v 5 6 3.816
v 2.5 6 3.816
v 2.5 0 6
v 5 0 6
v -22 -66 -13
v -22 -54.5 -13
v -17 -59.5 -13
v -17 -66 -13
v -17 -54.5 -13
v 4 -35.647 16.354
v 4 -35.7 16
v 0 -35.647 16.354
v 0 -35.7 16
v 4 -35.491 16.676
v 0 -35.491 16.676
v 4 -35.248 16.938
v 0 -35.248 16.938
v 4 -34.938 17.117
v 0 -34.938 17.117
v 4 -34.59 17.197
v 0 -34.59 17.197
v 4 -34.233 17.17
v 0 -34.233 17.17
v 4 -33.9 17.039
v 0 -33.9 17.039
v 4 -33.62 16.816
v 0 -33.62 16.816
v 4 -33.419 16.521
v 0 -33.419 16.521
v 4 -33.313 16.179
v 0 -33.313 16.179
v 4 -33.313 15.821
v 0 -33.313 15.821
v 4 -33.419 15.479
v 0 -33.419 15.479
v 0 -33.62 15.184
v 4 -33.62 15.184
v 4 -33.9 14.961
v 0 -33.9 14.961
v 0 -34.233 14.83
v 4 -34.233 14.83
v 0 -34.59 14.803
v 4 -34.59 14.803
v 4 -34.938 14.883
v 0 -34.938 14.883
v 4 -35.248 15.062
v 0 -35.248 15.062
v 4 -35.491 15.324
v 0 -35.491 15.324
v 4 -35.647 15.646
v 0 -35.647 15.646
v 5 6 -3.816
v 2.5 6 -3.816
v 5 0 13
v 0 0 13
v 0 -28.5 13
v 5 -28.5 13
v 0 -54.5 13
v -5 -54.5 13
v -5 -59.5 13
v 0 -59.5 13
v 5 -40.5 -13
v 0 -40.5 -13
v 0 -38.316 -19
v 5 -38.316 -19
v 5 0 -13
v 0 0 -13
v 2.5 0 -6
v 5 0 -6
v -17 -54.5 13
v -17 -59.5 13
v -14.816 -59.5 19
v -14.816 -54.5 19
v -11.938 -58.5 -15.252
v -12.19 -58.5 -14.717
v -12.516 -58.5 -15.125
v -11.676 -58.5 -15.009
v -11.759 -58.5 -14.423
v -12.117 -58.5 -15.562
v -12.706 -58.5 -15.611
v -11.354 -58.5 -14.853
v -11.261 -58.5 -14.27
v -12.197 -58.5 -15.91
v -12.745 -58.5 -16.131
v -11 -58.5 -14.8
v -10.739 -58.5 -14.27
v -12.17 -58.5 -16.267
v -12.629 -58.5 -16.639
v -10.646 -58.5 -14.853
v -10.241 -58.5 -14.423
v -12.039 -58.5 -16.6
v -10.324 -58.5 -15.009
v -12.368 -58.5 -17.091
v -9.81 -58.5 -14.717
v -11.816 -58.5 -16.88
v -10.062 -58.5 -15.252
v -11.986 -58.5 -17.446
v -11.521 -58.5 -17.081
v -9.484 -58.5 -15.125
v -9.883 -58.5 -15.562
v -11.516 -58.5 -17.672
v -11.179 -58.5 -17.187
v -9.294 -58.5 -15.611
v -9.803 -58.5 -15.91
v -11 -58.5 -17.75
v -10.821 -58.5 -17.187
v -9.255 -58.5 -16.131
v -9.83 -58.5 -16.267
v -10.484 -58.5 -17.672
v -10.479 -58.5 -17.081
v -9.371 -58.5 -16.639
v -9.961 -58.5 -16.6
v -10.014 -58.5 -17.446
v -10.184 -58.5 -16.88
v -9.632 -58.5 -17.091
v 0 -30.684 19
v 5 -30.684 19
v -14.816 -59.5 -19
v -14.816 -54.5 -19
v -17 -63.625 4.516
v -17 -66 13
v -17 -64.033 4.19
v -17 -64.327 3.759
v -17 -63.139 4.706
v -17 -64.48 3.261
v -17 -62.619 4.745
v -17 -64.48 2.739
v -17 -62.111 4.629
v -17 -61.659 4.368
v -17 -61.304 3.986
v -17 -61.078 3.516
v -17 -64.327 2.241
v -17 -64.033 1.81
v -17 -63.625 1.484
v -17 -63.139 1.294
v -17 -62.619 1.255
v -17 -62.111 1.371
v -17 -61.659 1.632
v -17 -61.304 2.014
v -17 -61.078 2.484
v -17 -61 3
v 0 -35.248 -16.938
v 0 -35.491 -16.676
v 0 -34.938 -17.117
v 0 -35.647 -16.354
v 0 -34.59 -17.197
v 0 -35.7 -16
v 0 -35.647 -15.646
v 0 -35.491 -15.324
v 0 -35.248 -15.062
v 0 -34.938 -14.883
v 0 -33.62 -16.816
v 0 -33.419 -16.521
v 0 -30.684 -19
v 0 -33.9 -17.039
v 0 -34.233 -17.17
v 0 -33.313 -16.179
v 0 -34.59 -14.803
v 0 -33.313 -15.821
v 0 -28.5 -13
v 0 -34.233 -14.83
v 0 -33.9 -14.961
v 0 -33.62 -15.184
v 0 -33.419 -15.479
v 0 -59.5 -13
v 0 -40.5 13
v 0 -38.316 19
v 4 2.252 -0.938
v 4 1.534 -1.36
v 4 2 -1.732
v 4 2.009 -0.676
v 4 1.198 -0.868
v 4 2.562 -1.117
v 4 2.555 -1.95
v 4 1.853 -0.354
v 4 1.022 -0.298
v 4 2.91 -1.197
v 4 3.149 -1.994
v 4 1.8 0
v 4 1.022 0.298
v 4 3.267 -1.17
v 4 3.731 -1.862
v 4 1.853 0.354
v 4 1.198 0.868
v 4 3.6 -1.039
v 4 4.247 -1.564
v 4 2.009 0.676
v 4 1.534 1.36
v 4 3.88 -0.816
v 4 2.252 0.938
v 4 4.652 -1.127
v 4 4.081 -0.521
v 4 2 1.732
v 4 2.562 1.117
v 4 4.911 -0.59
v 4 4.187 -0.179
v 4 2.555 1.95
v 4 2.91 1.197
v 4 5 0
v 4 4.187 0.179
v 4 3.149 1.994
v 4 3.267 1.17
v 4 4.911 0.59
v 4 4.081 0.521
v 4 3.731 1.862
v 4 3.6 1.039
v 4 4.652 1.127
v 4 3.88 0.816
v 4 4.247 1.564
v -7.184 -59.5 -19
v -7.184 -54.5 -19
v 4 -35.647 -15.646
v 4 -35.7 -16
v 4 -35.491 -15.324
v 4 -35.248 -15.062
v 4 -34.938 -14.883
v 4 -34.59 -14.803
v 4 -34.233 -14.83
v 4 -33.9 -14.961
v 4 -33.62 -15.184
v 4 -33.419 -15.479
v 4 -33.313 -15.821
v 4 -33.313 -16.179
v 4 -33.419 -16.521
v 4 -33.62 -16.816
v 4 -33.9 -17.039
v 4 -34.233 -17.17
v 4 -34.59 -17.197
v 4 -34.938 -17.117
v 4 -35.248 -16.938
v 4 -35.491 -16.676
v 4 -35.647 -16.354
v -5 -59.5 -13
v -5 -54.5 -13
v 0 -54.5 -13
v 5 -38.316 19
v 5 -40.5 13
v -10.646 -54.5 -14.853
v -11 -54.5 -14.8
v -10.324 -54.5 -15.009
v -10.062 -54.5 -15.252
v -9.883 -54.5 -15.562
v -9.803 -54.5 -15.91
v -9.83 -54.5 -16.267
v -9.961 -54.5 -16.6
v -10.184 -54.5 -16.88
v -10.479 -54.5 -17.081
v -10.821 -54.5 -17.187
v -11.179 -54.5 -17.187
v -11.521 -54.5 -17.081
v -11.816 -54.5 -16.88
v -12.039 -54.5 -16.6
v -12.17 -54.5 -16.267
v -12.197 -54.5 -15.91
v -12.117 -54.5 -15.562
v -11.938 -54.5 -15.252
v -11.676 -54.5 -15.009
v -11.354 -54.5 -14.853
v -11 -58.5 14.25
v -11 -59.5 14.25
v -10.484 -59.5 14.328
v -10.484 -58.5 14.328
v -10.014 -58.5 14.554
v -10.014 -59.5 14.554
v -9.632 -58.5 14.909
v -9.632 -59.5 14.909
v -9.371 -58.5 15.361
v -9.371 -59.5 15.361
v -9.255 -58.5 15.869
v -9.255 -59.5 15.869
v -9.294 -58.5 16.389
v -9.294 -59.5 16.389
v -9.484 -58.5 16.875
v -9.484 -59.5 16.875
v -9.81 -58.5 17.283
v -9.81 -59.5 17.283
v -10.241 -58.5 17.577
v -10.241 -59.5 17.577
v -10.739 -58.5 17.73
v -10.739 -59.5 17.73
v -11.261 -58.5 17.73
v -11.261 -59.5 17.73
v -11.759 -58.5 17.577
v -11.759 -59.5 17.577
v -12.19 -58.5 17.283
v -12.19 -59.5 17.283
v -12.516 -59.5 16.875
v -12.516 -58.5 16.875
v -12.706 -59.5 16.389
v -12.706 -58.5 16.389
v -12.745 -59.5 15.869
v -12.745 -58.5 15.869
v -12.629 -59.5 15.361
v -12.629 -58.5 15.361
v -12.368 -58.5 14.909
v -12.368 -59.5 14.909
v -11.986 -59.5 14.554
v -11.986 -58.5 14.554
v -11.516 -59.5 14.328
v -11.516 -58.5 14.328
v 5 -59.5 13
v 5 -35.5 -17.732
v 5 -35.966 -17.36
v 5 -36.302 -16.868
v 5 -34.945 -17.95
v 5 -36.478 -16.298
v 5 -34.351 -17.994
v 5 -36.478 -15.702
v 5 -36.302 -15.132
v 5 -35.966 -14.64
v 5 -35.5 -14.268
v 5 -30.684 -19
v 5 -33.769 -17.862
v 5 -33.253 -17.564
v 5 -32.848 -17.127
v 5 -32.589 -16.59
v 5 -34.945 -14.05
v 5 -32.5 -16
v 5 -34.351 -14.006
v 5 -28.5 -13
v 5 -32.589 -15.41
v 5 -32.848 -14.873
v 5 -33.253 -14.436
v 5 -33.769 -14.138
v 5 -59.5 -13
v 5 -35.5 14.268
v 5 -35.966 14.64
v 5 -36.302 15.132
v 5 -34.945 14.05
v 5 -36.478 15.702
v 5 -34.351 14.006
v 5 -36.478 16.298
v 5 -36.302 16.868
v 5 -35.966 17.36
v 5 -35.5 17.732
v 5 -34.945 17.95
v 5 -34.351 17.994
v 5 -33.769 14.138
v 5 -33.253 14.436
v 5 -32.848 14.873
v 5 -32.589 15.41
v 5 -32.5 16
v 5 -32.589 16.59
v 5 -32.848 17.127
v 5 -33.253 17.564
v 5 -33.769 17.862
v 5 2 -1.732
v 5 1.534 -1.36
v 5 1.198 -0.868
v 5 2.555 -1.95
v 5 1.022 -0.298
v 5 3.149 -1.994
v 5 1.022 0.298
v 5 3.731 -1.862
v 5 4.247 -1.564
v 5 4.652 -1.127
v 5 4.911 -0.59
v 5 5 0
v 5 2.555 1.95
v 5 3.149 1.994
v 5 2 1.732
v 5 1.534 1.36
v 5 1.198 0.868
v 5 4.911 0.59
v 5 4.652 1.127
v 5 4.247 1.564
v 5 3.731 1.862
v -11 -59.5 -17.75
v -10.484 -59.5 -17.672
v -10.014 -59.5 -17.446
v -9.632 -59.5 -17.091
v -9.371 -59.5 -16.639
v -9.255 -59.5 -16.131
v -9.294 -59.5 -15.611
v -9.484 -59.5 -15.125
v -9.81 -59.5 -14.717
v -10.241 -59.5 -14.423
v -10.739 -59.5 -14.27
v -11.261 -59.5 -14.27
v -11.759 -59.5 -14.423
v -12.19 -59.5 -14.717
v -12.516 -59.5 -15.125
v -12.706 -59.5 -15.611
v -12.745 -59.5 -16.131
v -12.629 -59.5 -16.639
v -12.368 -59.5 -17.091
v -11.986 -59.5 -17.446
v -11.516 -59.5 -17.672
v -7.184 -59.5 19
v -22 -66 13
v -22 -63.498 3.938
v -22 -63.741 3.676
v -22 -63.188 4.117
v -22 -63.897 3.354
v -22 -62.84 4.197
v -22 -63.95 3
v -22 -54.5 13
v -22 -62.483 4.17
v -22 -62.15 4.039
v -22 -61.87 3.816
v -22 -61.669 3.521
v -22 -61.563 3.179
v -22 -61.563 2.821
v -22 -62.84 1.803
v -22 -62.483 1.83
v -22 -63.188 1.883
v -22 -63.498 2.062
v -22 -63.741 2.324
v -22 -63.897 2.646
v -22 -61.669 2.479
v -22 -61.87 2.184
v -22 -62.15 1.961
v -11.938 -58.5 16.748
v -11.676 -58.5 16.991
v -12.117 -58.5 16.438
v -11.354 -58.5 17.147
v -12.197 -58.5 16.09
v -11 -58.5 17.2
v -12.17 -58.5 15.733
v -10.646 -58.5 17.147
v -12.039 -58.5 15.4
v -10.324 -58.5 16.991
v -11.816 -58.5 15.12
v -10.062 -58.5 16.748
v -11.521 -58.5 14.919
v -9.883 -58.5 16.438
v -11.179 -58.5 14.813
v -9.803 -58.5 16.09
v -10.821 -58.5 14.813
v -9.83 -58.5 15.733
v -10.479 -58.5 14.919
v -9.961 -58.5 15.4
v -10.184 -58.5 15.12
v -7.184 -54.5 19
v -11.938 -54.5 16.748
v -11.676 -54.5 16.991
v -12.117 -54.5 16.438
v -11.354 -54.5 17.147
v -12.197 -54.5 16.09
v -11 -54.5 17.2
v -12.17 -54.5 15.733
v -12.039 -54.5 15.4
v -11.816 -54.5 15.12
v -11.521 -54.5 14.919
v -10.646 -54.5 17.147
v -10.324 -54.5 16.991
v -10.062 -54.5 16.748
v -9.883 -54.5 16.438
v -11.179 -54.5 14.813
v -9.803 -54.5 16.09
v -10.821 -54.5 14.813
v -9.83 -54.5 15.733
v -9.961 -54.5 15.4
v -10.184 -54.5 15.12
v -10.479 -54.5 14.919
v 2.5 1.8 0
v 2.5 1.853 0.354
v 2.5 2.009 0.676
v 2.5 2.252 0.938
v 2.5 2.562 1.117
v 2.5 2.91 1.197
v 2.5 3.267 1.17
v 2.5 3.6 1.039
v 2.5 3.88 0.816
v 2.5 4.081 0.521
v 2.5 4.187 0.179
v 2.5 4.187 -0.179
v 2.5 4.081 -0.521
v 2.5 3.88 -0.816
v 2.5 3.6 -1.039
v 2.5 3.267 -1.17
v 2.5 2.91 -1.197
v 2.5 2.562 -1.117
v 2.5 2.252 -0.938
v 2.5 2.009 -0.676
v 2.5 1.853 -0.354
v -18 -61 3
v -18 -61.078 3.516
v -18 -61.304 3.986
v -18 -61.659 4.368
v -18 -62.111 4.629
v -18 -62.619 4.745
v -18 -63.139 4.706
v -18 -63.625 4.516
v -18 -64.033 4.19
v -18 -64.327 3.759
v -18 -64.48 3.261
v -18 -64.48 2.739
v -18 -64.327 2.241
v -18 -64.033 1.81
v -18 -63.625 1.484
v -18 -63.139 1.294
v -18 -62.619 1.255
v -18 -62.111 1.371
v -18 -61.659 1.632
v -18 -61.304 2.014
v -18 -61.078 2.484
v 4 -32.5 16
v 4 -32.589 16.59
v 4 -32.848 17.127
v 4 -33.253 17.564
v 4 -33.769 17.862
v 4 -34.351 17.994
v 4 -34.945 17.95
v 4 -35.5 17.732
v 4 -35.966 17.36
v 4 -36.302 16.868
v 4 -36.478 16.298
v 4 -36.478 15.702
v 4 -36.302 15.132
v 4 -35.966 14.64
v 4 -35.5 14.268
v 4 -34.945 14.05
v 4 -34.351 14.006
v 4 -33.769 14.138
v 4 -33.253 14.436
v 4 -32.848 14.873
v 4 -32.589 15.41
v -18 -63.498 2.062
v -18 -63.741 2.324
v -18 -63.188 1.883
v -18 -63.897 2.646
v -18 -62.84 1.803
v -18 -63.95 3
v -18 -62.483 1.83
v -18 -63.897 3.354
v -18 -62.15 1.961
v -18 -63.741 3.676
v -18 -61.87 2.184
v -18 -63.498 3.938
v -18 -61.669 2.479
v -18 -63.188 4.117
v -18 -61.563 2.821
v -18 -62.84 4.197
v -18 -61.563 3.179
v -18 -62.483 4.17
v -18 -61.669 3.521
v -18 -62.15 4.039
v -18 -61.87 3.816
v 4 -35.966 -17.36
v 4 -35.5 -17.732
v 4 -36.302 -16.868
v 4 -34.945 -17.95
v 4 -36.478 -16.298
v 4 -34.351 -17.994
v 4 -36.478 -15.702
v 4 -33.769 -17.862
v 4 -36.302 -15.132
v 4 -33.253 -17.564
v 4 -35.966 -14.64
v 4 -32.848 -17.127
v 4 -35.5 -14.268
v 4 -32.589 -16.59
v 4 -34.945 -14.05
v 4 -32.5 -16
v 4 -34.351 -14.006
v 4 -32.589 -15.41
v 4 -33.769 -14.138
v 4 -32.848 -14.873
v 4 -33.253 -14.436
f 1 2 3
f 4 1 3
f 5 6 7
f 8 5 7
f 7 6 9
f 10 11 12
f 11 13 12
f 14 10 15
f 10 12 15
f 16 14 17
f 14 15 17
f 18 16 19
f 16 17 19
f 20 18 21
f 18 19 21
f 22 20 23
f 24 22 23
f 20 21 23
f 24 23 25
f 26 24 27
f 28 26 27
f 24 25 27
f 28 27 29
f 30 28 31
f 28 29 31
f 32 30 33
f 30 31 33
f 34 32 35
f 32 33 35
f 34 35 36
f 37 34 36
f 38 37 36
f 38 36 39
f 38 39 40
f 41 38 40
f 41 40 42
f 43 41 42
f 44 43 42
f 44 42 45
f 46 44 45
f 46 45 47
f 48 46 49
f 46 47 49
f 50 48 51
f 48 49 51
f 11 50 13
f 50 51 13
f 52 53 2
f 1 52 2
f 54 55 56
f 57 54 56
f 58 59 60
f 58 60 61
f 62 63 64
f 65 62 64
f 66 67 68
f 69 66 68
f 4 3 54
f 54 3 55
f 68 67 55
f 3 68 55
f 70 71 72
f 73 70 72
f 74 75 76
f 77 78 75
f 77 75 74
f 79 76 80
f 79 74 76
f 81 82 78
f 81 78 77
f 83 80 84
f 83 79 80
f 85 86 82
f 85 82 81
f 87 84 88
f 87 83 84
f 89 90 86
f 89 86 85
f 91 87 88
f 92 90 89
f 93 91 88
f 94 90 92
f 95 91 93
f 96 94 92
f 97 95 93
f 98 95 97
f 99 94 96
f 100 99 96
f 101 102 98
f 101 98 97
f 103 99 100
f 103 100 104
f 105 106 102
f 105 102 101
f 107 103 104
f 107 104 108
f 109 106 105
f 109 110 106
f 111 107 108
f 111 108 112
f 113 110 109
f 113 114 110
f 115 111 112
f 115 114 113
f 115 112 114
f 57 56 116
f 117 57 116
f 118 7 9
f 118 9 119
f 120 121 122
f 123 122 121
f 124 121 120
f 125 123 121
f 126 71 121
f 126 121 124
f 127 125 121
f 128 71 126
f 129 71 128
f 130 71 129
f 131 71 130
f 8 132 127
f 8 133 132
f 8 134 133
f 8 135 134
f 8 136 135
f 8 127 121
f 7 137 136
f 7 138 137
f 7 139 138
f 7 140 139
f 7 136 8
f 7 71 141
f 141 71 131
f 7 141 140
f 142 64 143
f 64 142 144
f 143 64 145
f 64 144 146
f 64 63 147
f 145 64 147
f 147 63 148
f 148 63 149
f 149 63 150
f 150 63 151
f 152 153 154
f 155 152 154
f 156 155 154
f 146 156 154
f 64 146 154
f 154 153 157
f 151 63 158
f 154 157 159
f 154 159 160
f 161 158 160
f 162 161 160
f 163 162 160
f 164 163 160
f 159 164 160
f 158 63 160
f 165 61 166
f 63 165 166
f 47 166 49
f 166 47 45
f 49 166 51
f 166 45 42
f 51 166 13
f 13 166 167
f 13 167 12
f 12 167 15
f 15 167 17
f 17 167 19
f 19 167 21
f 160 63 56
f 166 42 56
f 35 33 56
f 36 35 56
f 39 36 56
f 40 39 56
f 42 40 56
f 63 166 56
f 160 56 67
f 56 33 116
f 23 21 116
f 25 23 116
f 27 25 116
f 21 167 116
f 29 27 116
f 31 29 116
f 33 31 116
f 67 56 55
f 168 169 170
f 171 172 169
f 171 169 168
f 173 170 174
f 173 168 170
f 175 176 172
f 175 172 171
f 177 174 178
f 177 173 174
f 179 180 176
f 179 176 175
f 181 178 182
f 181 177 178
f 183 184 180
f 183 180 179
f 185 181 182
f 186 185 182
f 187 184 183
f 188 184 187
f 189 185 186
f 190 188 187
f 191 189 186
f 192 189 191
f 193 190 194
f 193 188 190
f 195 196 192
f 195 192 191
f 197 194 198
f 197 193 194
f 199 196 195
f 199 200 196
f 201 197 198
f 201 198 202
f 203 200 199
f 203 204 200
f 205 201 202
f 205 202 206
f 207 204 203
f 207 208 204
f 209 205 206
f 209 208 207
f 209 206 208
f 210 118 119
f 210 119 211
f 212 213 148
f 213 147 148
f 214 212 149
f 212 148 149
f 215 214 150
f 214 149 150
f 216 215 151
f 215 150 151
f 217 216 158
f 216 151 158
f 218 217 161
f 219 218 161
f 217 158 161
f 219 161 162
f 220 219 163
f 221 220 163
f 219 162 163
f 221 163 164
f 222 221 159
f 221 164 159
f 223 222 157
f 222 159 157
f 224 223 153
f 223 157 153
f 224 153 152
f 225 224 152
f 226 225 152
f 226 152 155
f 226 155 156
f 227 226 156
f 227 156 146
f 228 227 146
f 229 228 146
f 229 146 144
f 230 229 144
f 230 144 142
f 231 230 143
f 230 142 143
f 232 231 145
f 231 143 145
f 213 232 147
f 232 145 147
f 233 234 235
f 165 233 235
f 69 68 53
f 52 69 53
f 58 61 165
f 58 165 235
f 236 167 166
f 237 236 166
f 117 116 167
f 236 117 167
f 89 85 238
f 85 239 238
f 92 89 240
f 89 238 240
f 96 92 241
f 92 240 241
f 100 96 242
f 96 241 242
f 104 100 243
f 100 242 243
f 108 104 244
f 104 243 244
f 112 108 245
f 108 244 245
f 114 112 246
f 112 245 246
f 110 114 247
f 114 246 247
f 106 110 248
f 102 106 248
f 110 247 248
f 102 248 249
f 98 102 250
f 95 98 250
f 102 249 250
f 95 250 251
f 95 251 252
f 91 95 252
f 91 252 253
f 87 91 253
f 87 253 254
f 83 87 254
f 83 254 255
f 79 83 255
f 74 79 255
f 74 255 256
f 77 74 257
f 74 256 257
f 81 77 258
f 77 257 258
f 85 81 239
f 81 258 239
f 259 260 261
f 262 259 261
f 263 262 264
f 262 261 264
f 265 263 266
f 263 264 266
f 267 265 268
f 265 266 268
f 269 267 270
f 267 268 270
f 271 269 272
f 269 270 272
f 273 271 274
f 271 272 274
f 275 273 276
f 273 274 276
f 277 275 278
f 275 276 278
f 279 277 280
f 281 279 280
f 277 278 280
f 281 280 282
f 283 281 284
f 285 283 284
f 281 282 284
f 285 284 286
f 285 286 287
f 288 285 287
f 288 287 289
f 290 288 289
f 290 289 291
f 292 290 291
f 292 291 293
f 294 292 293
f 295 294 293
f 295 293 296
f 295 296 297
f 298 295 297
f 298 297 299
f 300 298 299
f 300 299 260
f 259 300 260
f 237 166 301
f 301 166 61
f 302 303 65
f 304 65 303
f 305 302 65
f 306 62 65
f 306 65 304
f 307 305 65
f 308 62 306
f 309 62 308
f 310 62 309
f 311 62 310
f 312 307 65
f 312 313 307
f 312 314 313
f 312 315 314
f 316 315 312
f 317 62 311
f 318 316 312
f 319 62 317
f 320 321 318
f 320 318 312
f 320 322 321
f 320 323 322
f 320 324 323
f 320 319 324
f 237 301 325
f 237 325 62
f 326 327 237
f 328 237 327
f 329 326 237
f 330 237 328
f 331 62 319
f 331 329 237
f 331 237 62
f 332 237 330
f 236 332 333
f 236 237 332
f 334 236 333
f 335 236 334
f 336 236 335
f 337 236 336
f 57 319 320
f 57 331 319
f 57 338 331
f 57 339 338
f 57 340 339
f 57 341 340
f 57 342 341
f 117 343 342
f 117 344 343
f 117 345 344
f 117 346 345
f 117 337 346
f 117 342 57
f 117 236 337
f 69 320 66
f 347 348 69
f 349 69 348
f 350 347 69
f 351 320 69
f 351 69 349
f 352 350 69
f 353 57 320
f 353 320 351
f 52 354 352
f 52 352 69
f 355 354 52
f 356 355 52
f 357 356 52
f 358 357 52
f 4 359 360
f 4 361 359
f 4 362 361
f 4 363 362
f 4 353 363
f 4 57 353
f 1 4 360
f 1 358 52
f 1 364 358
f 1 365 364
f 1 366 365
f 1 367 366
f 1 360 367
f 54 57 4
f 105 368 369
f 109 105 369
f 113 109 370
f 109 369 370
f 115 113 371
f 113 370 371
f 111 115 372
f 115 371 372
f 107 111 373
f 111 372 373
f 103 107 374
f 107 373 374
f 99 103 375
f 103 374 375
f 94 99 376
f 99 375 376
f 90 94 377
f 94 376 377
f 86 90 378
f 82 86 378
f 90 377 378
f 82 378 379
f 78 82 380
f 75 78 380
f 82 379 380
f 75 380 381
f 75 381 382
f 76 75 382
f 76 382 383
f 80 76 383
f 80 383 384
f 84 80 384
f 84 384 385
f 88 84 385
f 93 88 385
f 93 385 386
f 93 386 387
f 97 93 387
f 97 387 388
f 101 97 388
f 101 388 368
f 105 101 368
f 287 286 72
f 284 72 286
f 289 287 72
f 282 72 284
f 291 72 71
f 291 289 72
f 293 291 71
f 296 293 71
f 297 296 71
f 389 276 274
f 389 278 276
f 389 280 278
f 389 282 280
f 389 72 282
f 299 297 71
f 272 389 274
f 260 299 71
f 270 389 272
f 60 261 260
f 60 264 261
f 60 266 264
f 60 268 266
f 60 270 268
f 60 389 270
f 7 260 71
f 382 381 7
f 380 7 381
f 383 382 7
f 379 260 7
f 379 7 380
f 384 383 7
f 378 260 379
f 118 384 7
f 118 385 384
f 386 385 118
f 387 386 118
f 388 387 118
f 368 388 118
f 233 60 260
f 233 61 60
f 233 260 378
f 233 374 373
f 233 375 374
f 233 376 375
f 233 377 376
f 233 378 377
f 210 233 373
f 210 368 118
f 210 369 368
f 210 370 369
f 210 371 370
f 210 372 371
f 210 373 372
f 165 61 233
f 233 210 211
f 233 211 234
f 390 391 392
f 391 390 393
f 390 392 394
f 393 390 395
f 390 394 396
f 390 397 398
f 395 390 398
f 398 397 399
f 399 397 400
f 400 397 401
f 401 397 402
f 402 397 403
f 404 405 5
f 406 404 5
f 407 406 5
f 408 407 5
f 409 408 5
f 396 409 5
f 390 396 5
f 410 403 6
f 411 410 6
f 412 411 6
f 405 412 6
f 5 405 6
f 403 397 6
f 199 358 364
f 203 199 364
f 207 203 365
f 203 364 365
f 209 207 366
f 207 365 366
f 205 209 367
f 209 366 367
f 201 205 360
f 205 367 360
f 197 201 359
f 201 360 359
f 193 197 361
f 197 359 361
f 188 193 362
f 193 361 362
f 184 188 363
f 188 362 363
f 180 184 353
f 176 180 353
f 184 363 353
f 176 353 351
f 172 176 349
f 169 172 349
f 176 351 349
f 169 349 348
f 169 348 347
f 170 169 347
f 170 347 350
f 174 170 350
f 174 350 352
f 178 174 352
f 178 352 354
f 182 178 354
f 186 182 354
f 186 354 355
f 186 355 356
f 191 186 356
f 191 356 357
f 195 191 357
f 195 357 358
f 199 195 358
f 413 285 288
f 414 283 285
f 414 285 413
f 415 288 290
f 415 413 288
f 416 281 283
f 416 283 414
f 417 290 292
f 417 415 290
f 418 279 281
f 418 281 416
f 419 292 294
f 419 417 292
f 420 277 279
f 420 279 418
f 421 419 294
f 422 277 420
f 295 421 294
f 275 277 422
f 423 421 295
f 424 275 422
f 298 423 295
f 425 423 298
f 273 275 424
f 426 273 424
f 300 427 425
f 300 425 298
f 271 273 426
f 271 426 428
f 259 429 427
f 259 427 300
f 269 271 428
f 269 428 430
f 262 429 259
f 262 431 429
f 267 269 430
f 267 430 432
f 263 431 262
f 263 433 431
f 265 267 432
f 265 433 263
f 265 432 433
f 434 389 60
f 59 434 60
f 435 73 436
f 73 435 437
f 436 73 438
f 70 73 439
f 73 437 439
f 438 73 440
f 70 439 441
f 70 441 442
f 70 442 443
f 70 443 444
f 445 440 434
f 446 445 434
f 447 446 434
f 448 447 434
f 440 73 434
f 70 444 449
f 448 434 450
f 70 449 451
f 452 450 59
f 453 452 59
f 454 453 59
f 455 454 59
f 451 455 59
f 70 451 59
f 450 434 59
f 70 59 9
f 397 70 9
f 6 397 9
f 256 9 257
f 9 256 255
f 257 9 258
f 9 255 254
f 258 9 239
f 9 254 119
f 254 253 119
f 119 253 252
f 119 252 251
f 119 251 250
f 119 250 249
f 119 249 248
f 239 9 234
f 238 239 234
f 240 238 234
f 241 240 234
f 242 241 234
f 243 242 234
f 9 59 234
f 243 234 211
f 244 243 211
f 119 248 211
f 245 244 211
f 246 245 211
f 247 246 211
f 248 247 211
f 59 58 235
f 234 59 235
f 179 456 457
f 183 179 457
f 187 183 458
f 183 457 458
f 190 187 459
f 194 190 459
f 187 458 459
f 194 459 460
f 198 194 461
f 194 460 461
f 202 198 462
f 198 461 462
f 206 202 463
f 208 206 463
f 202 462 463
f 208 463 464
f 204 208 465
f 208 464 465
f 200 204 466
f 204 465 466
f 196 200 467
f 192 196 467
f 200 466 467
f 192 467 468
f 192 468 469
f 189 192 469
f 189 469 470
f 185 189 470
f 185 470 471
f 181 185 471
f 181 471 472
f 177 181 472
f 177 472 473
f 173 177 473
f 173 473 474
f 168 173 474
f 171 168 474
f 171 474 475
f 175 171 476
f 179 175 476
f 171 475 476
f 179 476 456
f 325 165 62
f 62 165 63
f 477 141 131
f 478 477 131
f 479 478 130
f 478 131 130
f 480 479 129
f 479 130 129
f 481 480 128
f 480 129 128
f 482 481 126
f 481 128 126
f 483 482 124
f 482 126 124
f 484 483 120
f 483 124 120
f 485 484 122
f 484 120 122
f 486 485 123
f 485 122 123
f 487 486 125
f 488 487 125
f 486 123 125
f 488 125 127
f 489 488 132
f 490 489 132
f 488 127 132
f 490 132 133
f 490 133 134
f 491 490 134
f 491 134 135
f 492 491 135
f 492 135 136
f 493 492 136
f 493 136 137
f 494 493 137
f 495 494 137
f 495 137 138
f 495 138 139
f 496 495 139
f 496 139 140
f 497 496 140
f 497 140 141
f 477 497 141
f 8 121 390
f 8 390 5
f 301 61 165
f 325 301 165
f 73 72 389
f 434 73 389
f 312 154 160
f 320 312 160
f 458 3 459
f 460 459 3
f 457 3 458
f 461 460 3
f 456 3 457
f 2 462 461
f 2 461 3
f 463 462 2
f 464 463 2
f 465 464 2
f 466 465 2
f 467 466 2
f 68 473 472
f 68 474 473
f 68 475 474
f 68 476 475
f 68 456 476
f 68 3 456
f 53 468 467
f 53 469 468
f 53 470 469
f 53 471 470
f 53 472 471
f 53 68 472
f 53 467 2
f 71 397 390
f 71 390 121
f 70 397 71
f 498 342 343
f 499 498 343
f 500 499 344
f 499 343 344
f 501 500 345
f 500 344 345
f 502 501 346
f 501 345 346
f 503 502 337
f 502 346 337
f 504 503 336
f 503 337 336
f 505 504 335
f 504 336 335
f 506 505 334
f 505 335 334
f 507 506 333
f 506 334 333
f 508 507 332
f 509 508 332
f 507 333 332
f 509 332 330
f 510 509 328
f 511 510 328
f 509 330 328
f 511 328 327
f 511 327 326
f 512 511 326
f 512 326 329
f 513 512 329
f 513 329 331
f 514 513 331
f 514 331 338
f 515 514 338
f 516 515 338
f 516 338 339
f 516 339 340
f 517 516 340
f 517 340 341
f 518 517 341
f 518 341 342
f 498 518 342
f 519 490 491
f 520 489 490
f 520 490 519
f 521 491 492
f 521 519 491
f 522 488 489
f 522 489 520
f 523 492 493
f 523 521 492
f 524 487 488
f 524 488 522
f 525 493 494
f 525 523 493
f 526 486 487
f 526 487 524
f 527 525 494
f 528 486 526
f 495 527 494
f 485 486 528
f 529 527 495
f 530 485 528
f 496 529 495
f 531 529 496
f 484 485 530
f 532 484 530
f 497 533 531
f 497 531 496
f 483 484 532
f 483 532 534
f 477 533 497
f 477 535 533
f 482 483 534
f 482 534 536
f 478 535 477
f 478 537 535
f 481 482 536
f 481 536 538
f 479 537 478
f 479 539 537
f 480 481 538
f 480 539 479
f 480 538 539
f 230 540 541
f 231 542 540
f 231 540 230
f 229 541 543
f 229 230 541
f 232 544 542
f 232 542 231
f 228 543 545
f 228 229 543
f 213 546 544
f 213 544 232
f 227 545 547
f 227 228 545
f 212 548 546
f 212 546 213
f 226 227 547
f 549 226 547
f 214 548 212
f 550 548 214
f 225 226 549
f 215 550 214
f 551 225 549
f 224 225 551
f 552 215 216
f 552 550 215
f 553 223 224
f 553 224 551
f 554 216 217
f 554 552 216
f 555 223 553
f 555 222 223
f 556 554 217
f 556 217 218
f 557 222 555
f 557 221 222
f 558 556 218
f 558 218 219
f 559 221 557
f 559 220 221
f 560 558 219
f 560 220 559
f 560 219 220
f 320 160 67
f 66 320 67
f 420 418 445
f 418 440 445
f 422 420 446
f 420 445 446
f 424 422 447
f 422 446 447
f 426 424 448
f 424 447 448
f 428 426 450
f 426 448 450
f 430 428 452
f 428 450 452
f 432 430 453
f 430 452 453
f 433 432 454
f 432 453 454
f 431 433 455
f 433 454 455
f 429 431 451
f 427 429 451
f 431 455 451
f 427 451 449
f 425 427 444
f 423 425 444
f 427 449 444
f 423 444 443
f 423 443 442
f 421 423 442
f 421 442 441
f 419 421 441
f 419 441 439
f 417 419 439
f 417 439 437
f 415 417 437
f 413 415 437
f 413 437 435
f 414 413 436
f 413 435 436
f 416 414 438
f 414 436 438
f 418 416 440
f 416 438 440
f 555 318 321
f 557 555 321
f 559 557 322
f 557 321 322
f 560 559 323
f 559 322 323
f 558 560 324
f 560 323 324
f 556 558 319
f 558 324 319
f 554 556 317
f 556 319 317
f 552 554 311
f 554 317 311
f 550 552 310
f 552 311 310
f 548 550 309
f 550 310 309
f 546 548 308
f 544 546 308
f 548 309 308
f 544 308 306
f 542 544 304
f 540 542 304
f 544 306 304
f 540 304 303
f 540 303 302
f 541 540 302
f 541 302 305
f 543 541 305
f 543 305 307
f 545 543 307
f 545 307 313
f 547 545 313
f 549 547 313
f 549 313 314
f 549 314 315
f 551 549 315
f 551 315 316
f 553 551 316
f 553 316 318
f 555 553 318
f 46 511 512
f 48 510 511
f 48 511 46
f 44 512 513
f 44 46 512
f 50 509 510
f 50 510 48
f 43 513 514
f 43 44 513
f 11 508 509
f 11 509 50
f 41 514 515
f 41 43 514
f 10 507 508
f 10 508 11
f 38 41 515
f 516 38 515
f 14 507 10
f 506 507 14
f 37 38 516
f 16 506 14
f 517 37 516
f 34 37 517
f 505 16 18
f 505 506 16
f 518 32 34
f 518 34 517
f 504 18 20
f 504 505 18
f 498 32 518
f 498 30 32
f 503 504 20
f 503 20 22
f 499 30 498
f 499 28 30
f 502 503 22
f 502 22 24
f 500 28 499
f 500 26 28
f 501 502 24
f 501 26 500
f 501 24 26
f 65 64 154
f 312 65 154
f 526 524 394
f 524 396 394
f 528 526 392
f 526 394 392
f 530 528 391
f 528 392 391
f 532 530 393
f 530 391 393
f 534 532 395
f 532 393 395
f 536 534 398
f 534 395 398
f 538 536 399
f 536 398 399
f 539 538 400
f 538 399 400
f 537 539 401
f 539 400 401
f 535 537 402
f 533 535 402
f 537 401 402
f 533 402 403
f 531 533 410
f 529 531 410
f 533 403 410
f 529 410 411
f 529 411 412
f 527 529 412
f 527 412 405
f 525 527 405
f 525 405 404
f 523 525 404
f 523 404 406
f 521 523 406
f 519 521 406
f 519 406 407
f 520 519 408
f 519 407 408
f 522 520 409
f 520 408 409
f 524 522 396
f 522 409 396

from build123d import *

# Parameters (mm, degrees)
PAD_DEPTH           = 5
HOLE_D              = 2.4
HOLE_DEPTH          = 25
HOLE_CBORE_D        = 4
HOLE_CBORE_DEPTH    = 1
POCKET_DEPTH        = 2.5
SKETCH036_W         = 5
SKETCH036_H         = 26
PAD001_DEPTH        = 22
SKETCH037_W         = 26
SKETCH037_H         = 5
PAD002_DEPTH        = 6.5
HOLE001_D           = 2.4
HOLE001_DEPTH       = 25
HOLE001_CBORE_D     = 3.5
HOLE001_CBORE_DEPTH = 1
PAD003_DEPTH        = 5
HOLE002_D           = 2.4
HOLE002_DEPTH       = 25
HOLE002_CBORE_D     = 3.5
HOLE002_CBORE_DEPTH = 1


with BuildPart() as ch001:
    # Sketch → Pad (new body)
    with BuildSketch(Plane.YZ):
        Polygon((-59.5, 13), (-59.5, -13), (-40.5, -13), (-38.316179, -19), (-30.683821, -19), (-28.5, -13), (0, -13), (0, -6), (6, -3.816179), (6, 3.816179), (0, 6), (0, 13), (-28.5, 13), (-30.683821, 19), (-38.316179, 19), (-40.5, 13), align=None)
    extrude(amount=PAD_DEPTH)

    # Hole
    with Locations(Plane.YZ.offset(5)):
        with Locations((-34.5, 16), (-34.5, -16), (3, 0)):
            CounterBoreHole(HOLE_D / 2, HOLE_CBORE_D / 2, HOLE_CBORE_DEPTH, depth=HOLE_DEPTH)

    # Sketch035 (on Face4 of Hole) → Pocket (cut)
    with BuildSketch(Plane(origin=(0, 0, 0), x_dir=(0, 1, 0), z_dir=(-1, 0, 0))):
        Polygon((0, 6), (0, -6), (6, -3.816179), (6, 3.816179), align=None)
    extrude(amount=-POCKET_DEPTH, mode=Mode.SUBTRACT)


with BuildPart() as ch002:
    # Sketch036 → Pad001 (new body)
    with BuildSketch(Plane.YZ):
        with Locations((-57, 0)):
            Rectangle(SKETCH036_W, SKETCH036_H)
    extrude(amount=-PAD001_DEPTH)

    # Sketch037 (on Face1 of Pad001) → Pad002 (join)
    with BuildSketch(Plane(origin=(0, -59.5, 0), x_dir=(0, 0, -1), z_dir=(0, -1, 0))):
        with Locations((0, -19.5)):
            Rectangle(SKETCH037_W, SKETCH037_H)
    extrude(amount=PAD002_DEPTH)

    # Hole001
    with Locations(Plane.YZ.offset(-17)):
        with Locations((-62.75, 3)):
            CounterBoreHole(HOLE001_D / 2, HOLE001_CBORE_D / 2, HOLE001_CBORE_DEPTH, depth=HOLE001_DEPTH)

    # Sketch040 (on Face1 of Pad001) → Pad003 (join)
    with BuildSketch(Plane(origin=(0, -59.5, 0), x_dir=(0, 0, -1), z_dir=(0, -1, 0))):
        Polygon((13, -17), (19, -14.816179), (19, -7.183821), (13, -5), align=None)
        Polygon((-13, -17), (-19, -14.816179), (-19, -7.183821), (-13, -5), align=None)
    extrude(amount=-PAD003_DEPTH)

    # Hole002
    with Locations(Plane(origin=(0, -59.5, 0), x_dir=(0, 0, -1), z_dir=(0, -1, 0))):
        with Locations((16, -11), (-16, -11)):
            CounterBoreHole(HOLE002_D / 2, HOLE002_CBORE_D / 2, HOLE002_CBORE_DEPTH, depth=HOLE002_DEPTH)


solid = Compound([ch001.part, ch002.part])
